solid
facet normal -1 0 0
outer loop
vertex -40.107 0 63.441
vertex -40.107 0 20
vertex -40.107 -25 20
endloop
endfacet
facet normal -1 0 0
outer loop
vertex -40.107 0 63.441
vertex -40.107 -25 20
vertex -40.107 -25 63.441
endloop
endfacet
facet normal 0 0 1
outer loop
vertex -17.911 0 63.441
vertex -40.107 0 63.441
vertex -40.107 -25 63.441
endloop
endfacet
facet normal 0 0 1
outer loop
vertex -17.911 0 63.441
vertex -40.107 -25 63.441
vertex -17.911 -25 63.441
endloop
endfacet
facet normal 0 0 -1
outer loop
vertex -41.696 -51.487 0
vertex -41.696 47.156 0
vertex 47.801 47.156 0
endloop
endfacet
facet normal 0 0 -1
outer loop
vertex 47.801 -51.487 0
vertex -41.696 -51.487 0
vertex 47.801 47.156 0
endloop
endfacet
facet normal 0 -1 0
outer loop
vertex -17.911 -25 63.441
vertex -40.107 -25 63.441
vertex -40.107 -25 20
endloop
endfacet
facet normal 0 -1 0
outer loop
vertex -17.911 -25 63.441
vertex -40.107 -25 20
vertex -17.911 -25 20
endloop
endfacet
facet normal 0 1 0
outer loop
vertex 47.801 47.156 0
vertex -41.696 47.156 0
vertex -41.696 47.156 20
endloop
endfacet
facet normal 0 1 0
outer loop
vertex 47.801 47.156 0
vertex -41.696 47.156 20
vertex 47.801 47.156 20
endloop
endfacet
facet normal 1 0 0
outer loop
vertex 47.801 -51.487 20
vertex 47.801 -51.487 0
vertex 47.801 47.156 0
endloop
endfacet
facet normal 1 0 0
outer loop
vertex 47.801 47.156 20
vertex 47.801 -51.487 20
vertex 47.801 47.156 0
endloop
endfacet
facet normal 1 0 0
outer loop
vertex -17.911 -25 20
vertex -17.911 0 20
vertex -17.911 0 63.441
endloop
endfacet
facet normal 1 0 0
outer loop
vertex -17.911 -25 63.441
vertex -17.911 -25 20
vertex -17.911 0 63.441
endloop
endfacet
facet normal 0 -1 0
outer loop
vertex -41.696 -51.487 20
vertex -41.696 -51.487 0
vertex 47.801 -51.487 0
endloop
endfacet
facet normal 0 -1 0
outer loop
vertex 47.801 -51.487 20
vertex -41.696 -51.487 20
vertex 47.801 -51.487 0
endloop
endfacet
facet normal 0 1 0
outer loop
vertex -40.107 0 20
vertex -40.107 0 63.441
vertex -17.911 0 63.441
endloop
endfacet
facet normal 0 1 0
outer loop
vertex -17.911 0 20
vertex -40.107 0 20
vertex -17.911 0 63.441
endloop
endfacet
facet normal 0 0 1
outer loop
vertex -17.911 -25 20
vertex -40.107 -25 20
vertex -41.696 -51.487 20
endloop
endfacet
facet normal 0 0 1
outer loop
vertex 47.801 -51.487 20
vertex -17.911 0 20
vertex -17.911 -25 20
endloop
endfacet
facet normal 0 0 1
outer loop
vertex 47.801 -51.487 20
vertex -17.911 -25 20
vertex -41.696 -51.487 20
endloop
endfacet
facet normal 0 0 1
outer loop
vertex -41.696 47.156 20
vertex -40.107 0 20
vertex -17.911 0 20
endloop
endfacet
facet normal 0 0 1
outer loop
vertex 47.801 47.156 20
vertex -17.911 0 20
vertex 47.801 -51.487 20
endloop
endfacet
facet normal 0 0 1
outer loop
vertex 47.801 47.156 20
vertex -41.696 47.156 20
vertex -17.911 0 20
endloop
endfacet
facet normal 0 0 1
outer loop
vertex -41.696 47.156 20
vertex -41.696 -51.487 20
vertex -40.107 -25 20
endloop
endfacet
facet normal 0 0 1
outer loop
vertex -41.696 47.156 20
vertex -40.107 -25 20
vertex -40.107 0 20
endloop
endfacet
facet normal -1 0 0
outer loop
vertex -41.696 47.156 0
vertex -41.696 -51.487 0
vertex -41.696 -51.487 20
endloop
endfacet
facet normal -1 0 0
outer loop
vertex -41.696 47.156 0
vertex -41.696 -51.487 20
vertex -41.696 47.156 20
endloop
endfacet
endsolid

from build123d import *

# Parameters (mm, degrees)
F0_W     = 89.496315
F0_H     = 98.643005
F1_DEPTH = 20
F2_W     = 22.195481
F2_H     = 63.440859
F3_DEPTH = 25


with BuildPart() as f1:
    # F0 (on Top) → F1 (new body)
    with BuildSketch(Plane.XY):
        with Locations((3.052593, -2.165347)):
            Rectangle(F0_W, F0_H)
    extrude(amount=F1_DEPTH)

    # F2 (on Front) → F3 (join)
    with BuildSketch(Plane.XZ):
        with Locations((-29.008787, 31.720429)):
            Rectangle(F2_W, F2_H)
    extrude(amount=F3_DEPTH)


solid = f1.part
